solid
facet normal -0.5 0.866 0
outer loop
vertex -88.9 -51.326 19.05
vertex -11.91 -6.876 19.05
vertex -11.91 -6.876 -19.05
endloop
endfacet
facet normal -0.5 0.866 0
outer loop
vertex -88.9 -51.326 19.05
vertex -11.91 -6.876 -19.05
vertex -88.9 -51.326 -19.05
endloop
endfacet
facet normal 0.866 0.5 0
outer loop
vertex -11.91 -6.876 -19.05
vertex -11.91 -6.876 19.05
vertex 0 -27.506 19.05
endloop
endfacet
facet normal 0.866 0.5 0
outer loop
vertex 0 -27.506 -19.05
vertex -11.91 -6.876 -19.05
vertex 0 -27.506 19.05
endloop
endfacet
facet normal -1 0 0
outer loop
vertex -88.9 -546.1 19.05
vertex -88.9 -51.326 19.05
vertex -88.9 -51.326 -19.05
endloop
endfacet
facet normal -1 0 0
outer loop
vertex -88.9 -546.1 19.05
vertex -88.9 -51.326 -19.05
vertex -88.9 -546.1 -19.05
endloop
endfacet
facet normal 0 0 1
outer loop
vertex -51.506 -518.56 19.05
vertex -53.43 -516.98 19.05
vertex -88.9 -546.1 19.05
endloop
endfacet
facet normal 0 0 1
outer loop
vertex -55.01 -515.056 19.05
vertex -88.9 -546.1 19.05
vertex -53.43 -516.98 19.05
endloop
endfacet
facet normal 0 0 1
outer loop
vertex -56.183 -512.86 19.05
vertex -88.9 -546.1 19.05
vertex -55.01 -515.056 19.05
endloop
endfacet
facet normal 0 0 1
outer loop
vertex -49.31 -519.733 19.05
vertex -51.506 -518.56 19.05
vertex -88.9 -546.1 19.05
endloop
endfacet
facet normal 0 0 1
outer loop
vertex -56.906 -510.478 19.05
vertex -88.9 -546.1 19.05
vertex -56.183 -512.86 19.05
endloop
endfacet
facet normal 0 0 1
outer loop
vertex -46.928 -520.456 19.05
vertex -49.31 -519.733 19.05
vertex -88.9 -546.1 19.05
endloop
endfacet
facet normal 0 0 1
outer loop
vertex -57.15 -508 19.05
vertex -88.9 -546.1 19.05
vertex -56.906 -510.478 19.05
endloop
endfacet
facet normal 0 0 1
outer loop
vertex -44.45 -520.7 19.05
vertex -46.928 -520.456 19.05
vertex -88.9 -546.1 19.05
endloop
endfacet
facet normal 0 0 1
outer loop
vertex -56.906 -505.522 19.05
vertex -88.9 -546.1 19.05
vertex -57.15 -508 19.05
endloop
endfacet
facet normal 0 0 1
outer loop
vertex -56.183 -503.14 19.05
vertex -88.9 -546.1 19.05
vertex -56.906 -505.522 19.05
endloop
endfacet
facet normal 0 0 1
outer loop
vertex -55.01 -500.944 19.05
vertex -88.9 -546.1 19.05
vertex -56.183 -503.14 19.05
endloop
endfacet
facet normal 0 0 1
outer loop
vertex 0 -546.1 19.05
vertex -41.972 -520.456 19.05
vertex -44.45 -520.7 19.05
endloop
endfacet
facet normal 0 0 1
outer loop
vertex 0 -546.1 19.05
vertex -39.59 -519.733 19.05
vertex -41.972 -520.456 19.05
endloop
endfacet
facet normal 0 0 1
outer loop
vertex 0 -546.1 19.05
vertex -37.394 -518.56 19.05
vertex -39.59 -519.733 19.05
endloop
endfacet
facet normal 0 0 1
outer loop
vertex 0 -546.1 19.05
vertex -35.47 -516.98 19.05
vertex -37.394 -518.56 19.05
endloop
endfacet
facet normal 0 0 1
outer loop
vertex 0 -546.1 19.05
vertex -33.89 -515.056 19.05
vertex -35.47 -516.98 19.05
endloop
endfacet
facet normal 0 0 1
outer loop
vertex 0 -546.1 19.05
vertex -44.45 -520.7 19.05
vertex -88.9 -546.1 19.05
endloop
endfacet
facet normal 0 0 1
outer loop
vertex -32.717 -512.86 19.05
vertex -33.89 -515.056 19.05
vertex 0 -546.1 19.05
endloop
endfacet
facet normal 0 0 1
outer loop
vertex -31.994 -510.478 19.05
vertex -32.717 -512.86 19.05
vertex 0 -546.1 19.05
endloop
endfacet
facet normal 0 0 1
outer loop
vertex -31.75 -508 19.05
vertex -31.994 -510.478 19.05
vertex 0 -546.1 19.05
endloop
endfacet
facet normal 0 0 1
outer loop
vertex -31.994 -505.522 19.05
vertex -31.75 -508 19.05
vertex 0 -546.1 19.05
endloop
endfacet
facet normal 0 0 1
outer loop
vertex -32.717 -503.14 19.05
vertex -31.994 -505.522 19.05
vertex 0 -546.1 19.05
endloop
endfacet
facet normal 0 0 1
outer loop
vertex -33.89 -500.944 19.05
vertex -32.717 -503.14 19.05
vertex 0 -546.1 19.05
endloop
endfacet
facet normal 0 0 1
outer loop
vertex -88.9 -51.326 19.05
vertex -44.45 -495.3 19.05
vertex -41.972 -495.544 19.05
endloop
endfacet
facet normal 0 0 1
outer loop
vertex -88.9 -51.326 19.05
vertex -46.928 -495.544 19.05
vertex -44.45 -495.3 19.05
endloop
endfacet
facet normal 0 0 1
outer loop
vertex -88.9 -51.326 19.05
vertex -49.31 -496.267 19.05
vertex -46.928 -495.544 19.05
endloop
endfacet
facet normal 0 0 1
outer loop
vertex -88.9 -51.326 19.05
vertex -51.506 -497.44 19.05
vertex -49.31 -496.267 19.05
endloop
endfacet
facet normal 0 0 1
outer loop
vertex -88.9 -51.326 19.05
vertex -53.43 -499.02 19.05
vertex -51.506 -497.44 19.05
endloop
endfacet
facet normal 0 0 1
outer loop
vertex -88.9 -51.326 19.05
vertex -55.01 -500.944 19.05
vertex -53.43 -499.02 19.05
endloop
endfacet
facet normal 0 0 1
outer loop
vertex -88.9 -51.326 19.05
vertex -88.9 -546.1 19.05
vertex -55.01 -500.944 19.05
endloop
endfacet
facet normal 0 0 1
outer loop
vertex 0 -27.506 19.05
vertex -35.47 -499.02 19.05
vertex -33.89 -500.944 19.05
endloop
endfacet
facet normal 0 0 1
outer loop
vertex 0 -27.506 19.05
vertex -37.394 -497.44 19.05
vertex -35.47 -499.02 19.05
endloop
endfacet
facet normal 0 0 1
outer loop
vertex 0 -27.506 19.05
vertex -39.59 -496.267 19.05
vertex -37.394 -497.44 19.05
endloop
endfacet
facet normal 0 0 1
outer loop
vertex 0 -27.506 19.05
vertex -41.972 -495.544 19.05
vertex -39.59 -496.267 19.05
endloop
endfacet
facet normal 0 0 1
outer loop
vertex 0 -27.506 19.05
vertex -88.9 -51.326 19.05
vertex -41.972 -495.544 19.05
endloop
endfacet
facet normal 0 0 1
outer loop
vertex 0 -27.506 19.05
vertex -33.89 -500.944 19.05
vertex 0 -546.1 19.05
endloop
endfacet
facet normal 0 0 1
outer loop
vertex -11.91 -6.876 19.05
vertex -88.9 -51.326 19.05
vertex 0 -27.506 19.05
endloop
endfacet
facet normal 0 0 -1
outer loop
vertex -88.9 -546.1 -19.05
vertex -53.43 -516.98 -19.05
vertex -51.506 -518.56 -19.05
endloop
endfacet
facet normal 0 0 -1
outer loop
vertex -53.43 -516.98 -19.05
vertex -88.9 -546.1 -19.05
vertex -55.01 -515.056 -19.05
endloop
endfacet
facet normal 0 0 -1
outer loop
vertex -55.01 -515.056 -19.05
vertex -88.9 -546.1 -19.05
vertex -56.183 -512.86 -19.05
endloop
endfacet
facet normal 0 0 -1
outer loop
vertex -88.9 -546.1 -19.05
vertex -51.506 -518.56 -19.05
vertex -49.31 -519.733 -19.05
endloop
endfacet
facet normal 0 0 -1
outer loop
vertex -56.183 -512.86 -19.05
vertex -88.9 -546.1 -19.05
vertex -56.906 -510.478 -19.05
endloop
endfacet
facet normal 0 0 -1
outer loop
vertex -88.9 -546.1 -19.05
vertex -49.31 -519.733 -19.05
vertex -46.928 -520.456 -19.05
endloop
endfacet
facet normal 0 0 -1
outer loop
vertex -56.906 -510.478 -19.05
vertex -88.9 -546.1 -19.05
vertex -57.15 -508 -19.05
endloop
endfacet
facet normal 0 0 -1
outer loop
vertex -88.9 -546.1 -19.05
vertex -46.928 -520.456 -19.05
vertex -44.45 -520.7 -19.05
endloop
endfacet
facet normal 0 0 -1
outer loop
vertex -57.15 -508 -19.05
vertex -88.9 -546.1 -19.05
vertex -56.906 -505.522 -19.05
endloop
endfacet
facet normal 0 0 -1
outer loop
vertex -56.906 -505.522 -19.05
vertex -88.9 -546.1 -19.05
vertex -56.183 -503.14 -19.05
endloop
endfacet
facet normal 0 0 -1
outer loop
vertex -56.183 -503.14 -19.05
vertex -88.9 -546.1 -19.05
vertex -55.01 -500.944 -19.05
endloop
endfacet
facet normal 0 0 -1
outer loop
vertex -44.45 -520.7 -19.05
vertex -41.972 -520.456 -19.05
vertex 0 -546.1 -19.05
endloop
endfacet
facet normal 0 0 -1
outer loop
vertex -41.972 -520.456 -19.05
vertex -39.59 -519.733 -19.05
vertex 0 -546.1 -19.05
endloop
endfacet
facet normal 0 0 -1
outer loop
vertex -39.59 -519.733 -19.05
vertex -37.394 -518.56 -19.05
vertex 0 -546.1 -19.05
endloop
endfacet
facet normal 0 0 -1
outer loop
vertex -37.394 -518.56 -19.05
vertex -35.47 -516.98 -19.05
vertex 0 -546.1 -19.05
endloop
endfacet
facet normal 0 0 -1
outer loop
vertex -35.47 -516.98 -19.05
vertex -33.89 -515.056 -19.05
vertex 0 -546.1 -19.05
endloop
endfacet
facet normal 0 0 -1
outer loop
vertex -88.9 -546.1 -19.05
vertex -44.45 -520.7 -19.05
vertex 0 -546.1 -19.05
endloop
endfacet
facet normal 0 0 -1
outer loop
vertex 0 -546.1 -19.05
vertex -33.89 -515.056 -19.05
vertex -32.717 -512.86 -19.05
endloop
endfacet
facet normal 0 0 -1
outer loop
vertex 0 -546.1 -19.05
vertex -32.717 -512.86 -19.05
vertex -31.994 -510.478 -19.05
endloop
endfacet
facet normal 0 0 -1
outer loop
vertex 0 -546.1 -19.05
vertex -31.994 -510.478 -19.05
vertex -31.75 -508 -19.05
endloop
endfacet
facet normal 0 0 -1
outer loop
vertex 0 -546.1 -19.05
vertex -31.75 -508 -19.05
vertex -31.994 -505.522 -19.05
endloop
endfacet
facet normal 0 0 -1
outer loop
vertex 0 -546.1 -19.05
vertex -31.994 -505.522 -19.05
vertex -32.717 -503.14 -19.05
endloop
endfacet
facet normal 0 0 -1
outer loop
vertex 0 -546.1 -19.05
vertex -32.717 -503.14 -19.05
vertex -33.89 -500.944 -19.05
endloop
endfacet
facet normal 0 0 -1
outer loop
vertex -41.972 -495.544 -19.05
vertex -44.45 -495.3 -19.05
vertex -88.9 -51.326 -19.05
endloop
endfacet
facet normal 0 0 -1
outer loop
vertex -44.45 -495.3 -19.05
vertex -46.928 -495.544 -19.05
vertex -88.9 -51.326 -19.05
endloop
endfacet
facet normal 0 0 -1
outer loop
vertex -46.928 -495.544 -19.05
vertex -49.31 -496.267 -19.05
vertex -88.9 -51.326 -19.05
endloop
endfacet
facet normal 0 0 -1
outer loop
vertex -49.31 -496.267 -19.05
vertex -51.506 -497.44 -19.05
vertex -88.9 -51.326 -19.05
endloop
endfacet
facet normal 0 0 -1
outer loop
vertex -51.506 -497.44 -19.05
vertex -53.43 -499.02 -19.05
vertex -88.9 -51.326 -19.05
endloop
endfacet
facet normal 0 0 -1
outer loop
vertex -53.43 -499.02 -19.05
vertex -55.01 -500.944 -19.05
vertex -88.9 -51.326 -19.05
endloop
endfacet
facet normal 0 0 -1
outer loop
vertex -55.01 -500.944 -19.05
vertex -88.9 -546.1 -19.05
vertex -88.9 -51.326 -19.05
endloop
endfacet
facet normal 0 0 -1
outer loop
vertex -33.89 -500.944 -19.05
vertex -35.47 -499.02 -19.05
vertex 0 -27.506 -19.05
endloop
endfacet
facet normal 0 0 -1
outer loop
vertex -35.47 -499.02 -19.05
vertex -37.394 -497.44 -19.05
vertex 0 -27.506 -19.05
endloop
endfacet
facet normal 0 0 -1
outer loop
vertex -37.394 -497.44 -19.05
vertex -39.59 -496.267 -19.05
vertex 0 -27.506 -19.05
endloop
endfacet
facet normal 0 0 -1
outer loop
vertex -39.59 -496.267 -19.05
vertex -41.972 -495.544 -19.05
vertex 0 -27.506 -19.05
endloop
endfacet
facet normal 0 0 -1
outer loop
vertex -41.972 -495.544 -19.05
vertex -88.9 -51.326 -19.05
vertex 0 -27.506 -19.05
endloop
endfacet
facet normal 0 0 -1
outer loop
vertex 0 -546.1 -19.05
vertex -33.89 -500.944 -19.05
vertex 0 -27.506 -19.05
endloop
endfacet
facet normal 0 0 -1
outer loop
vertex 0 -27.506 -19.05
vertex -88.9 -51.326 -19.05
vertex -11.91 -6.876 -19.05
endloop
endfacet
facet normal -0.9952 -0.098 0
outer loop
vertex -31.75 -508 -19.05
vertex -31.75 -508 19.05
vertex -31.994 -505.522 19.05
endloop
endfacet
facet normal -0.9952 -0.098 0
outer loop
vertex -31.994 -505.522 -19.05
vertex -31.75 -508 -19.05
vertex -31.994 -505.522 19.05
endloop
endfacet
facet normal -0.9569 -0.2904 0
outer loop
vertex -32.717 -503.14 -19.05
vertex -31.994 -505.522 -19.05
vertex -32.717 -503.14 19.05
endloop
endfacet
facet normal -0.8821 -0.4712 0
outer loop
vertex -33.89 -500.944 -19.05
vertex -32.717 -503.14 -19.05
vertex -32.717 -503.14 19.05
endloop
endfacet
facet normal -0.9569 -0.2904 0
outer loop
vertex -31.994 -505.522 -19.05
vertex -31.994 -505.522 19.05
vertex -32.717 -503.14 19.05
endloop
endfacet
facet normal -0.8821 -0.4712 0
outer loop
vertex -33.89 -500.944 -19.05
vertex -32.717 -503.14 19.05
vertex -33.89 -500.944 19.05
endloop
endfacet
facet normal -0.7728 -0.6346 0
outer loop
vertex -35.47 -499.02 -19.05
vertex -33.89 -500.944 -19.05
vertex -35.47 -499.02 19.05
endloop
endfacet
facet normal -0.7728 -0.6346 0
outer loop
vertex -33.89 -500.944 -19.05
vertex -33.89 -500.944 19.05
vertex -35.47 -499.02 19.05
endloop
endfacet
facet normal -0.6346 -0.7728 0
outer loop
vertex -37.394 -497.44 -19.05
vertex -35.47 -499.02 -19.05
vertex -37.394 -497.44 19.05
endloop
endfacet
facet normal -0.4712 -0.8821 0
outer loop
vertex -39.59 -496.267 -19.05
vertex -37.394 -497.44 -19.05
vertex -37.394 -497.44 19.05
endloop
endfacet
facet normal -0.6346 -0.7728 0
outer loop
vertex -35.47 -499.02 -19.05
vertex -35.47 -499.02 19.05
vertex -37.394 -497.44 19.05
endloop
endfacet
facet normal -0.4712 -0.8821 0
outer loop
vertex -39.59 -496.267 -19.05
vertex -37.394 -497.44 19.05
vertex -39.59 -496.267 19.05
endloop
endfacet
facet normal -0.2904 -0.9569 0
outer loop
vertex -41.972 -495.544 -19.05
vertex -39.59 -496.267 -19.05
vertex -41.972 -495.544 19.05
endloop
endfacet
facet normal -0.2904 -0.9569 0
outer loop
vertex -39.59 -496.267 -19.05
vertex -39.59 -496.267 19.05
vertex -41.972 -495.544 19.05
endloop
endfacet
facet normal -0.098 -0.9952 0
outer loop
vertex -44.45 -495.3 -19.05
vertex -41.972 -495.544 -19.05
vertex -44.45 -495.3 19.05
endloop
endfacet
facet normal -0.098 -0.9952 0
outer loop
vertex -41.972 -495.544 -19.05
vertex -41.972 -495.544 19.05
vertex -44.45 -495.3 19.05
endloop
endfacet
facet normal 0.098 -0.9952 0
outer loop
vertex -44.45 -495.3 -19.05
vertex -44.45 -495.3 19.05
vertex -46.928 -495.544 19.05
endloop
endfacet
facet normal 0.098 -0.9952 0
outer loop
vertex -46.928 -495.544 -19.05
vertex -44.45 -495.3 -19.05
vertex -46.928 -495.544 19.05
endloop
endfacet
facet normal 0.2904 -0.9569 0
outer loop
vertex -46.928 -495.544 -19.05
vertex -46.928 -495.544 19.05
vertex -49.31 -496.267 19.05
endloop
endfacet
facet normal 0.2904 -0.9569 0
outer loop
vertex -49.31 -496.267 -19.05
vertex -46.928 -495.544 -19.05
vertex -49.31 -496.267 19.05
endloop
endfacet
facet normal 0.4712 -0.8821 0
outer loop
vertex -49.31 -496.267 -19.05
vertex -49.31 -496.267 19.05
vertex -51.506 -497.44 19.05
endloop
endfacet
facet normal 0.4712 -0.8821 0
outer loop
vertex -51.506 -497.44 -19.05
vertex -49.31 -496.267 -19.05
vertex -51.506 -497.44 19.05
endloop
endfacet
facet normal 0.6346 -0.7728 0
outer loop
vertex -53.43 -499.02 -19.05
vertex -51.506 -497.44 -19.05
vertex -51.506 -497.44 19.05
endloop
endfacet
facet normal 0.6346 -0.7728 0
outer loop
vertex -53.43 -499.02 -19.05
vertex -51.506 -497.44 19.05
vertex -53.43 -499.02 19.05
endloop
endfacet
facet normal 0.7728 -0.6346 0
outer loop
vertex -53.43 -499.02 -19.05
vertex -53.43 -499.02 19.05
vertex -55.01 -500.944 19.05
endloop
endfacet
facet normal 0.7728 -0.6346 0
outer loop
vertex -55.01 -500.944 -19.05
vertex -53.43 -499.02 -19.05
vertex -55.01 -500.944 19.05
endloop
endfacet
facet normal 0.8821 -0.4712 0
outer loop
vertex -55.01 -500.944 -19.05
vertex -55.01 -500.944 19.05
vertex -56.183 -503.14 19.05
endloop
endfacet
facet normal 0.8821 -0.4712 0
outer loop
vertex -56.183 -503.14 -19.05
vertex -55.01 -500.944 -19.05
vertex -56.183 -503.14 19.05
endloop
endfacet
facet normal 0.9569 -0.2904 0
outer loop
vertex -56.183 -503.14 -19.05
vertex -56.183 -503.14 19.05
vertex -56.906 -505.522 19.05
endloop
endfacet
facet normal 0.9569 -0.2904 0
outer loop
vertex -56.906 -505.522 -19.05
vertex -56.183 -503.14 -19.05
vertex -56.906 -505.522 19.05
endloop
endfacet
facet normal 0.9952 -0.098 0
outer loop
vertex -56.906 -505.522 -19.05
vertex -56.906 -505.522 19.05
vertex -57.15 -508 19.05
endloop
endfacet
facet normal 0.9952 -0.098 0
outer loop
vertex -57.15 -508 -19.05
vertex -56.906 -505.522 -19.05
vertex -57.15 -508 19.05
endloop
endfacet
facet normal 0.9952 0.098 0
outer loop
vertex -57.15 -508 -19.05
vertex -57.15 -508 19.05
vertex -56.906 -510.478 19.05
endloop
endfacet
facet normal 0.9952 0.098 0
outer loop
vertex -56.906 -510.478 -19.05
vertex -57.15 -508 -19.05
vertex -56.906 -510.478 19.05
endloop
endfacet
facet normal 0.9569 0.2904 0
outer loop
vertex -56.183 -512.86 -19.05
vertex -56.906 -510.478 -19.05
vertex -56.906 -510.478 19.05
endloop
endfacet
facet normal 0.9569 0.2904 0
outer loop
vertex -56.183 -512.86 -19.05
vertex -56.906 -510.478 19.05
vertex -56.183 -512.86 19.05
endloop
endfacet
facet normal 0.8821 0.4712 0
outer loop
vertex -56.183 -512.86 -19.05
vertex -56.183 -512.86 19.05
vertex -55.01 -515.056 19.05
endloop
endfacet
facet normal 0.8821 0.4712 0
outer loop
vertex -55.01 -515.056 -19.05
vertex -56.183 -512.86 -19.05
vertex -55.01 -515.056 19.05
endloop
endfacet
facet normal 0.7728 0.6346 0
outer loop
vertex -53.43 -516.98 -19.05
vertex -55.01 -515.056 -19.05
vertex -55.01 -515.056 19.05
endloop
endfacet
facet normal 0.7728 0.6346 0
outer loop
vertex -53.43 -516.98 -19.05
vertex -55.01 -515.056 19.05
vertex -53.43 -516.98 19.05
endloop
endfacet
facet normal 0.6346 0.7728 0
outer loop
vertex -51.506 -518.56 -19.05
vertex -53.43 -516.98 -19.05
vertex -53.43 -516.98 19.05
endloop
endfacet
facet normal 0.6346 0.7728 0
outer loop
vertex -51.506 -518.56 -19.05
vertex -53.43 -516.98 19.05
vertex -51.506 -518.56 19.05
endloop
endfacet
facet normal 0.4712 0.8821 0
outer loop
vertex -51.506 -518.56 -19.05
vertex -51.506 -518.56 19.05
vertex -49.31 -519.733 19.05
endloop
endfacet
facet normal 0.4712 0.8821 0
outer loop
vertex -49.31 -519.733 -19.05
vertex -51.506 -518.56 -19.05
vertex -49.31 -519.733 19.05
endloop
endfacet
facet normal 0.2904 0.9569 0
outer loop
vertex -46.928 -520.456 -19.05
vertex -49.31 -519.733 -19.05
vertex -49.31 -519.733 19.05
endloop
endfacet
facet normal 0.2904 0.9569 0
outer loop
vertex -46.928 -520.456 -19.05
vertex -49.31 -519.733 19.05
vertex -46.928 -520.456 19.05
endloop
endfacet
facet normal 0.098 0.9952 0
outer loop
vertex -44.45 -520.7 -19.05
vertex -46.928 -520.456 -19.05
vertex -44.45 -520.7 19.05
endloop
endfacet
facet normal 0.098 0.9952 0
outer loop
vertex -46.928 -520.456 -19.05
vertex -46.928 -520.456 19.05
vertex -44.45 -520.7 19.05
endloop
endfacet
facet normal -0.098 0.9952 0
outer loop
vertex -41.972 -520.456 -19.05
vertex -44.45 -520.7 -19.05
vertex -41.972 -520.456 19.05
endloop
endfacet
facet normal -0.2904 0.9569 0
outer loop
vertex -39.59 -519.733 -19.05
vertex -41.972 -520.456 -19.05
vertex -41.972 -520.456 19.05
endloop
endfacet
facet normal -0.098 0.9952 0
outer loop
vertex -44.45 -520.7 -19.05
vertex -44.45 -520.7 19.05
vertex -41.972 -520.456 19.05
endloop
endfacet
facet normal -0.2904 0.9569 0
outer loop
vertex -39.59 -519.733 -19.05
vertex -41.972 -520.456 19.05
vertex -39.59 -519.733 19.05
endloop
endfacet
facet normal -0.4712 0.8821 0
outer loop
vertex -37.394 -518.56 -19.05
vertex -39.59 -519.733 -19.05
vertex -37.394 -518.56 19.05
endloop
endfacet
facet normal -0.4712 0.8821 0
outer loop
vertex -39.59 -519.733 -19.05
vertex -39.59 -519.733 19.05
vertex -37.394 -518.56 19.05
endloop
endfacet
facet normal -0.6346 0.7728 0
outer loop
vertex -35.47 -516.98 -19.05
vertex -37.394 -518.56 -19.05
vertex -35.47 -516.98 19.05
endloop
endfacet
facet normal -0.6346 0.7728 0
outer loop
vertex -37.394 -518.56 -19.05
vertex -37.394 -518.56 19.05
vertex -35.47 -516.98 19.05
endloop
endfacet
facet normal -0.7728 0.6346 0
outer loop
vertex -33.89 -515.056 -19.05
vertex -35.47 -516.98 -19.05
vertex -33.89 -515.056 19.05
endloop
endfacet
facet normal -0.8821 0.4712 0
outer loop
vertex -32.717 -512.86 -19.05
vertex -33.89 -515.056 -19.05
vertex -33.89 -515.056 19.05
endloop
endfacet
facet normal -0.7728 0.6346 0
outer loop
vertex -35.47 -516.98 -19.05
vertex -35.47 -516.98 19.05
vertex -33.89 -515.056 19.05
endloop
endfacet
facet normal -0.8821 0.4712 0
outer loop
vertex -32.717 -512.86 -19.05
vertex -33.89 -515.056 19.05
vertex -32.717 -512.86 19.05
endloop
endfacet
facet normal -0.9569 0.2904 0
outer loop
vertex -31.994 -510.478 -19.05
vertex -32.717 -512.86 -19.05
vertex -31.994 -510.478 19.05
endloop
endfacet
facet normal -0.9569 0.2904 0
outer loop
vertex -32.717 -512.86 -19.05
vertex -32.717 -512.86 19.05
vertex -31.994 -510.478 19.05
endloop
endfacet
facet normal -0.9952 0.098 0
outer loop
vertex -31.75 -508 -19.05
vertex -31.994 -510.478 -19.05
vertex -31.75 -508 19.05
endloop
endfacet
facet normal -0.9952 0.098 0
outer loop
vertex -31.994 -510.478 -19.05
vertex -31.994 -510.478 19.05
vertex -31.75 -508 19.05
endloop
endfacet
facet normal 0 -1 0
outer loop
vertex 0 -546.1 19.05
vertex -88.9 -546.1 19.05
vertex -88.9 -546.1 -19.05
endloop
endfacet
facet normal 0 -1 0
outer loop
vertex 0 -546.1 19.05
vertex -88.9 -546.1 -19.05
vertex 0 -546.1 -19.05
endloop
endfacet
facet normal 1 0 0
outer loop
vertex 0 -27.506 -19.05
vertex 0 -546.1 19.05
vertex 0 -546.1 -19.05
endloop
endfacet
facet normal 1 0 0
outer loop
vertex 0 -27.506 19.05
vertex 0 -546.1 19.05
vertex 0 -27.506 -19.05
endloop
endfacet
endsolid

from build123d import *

# Parameters (mm, degrees)
F1_DEPTH = 19.05
F3_DEPTH = 38.101
F4_R     = 12.7
F5_DEPTH = 38.101


with BuildPart() as f1:
    # F0 (on Top) → F1 (new body, symmetric)
    with BuildSketch(Plane.XY):
        Polygon((0, 0), (-88.9, -51.326438931), (-88.9, -546.1), (0, -546.1), align=None)
    extrude(amount=F1_DEPTH, both=True)

    # F2 (on face) → F3 (cut, through all)
    with BuildSketch(Plane.XY.offset(19.05)):
        Polygon((0, -27.5057557238), (0, 0), (-11.9103416036, -6.876438931), align=None)
    extrude(amount=-F3_DEPTH, mode=Mode.SUBTRACT)

    # F4 (on face) → F5 (cut, through all)
    with BuildSketch(Plane.XY.offset(19.05)):
        with Locations((-44.45, -508)):
            Circle(F4_R)
    extrude(amount=-F5_DEPTH, mode=Mode.SUBTRACT)


solid = f1.part
